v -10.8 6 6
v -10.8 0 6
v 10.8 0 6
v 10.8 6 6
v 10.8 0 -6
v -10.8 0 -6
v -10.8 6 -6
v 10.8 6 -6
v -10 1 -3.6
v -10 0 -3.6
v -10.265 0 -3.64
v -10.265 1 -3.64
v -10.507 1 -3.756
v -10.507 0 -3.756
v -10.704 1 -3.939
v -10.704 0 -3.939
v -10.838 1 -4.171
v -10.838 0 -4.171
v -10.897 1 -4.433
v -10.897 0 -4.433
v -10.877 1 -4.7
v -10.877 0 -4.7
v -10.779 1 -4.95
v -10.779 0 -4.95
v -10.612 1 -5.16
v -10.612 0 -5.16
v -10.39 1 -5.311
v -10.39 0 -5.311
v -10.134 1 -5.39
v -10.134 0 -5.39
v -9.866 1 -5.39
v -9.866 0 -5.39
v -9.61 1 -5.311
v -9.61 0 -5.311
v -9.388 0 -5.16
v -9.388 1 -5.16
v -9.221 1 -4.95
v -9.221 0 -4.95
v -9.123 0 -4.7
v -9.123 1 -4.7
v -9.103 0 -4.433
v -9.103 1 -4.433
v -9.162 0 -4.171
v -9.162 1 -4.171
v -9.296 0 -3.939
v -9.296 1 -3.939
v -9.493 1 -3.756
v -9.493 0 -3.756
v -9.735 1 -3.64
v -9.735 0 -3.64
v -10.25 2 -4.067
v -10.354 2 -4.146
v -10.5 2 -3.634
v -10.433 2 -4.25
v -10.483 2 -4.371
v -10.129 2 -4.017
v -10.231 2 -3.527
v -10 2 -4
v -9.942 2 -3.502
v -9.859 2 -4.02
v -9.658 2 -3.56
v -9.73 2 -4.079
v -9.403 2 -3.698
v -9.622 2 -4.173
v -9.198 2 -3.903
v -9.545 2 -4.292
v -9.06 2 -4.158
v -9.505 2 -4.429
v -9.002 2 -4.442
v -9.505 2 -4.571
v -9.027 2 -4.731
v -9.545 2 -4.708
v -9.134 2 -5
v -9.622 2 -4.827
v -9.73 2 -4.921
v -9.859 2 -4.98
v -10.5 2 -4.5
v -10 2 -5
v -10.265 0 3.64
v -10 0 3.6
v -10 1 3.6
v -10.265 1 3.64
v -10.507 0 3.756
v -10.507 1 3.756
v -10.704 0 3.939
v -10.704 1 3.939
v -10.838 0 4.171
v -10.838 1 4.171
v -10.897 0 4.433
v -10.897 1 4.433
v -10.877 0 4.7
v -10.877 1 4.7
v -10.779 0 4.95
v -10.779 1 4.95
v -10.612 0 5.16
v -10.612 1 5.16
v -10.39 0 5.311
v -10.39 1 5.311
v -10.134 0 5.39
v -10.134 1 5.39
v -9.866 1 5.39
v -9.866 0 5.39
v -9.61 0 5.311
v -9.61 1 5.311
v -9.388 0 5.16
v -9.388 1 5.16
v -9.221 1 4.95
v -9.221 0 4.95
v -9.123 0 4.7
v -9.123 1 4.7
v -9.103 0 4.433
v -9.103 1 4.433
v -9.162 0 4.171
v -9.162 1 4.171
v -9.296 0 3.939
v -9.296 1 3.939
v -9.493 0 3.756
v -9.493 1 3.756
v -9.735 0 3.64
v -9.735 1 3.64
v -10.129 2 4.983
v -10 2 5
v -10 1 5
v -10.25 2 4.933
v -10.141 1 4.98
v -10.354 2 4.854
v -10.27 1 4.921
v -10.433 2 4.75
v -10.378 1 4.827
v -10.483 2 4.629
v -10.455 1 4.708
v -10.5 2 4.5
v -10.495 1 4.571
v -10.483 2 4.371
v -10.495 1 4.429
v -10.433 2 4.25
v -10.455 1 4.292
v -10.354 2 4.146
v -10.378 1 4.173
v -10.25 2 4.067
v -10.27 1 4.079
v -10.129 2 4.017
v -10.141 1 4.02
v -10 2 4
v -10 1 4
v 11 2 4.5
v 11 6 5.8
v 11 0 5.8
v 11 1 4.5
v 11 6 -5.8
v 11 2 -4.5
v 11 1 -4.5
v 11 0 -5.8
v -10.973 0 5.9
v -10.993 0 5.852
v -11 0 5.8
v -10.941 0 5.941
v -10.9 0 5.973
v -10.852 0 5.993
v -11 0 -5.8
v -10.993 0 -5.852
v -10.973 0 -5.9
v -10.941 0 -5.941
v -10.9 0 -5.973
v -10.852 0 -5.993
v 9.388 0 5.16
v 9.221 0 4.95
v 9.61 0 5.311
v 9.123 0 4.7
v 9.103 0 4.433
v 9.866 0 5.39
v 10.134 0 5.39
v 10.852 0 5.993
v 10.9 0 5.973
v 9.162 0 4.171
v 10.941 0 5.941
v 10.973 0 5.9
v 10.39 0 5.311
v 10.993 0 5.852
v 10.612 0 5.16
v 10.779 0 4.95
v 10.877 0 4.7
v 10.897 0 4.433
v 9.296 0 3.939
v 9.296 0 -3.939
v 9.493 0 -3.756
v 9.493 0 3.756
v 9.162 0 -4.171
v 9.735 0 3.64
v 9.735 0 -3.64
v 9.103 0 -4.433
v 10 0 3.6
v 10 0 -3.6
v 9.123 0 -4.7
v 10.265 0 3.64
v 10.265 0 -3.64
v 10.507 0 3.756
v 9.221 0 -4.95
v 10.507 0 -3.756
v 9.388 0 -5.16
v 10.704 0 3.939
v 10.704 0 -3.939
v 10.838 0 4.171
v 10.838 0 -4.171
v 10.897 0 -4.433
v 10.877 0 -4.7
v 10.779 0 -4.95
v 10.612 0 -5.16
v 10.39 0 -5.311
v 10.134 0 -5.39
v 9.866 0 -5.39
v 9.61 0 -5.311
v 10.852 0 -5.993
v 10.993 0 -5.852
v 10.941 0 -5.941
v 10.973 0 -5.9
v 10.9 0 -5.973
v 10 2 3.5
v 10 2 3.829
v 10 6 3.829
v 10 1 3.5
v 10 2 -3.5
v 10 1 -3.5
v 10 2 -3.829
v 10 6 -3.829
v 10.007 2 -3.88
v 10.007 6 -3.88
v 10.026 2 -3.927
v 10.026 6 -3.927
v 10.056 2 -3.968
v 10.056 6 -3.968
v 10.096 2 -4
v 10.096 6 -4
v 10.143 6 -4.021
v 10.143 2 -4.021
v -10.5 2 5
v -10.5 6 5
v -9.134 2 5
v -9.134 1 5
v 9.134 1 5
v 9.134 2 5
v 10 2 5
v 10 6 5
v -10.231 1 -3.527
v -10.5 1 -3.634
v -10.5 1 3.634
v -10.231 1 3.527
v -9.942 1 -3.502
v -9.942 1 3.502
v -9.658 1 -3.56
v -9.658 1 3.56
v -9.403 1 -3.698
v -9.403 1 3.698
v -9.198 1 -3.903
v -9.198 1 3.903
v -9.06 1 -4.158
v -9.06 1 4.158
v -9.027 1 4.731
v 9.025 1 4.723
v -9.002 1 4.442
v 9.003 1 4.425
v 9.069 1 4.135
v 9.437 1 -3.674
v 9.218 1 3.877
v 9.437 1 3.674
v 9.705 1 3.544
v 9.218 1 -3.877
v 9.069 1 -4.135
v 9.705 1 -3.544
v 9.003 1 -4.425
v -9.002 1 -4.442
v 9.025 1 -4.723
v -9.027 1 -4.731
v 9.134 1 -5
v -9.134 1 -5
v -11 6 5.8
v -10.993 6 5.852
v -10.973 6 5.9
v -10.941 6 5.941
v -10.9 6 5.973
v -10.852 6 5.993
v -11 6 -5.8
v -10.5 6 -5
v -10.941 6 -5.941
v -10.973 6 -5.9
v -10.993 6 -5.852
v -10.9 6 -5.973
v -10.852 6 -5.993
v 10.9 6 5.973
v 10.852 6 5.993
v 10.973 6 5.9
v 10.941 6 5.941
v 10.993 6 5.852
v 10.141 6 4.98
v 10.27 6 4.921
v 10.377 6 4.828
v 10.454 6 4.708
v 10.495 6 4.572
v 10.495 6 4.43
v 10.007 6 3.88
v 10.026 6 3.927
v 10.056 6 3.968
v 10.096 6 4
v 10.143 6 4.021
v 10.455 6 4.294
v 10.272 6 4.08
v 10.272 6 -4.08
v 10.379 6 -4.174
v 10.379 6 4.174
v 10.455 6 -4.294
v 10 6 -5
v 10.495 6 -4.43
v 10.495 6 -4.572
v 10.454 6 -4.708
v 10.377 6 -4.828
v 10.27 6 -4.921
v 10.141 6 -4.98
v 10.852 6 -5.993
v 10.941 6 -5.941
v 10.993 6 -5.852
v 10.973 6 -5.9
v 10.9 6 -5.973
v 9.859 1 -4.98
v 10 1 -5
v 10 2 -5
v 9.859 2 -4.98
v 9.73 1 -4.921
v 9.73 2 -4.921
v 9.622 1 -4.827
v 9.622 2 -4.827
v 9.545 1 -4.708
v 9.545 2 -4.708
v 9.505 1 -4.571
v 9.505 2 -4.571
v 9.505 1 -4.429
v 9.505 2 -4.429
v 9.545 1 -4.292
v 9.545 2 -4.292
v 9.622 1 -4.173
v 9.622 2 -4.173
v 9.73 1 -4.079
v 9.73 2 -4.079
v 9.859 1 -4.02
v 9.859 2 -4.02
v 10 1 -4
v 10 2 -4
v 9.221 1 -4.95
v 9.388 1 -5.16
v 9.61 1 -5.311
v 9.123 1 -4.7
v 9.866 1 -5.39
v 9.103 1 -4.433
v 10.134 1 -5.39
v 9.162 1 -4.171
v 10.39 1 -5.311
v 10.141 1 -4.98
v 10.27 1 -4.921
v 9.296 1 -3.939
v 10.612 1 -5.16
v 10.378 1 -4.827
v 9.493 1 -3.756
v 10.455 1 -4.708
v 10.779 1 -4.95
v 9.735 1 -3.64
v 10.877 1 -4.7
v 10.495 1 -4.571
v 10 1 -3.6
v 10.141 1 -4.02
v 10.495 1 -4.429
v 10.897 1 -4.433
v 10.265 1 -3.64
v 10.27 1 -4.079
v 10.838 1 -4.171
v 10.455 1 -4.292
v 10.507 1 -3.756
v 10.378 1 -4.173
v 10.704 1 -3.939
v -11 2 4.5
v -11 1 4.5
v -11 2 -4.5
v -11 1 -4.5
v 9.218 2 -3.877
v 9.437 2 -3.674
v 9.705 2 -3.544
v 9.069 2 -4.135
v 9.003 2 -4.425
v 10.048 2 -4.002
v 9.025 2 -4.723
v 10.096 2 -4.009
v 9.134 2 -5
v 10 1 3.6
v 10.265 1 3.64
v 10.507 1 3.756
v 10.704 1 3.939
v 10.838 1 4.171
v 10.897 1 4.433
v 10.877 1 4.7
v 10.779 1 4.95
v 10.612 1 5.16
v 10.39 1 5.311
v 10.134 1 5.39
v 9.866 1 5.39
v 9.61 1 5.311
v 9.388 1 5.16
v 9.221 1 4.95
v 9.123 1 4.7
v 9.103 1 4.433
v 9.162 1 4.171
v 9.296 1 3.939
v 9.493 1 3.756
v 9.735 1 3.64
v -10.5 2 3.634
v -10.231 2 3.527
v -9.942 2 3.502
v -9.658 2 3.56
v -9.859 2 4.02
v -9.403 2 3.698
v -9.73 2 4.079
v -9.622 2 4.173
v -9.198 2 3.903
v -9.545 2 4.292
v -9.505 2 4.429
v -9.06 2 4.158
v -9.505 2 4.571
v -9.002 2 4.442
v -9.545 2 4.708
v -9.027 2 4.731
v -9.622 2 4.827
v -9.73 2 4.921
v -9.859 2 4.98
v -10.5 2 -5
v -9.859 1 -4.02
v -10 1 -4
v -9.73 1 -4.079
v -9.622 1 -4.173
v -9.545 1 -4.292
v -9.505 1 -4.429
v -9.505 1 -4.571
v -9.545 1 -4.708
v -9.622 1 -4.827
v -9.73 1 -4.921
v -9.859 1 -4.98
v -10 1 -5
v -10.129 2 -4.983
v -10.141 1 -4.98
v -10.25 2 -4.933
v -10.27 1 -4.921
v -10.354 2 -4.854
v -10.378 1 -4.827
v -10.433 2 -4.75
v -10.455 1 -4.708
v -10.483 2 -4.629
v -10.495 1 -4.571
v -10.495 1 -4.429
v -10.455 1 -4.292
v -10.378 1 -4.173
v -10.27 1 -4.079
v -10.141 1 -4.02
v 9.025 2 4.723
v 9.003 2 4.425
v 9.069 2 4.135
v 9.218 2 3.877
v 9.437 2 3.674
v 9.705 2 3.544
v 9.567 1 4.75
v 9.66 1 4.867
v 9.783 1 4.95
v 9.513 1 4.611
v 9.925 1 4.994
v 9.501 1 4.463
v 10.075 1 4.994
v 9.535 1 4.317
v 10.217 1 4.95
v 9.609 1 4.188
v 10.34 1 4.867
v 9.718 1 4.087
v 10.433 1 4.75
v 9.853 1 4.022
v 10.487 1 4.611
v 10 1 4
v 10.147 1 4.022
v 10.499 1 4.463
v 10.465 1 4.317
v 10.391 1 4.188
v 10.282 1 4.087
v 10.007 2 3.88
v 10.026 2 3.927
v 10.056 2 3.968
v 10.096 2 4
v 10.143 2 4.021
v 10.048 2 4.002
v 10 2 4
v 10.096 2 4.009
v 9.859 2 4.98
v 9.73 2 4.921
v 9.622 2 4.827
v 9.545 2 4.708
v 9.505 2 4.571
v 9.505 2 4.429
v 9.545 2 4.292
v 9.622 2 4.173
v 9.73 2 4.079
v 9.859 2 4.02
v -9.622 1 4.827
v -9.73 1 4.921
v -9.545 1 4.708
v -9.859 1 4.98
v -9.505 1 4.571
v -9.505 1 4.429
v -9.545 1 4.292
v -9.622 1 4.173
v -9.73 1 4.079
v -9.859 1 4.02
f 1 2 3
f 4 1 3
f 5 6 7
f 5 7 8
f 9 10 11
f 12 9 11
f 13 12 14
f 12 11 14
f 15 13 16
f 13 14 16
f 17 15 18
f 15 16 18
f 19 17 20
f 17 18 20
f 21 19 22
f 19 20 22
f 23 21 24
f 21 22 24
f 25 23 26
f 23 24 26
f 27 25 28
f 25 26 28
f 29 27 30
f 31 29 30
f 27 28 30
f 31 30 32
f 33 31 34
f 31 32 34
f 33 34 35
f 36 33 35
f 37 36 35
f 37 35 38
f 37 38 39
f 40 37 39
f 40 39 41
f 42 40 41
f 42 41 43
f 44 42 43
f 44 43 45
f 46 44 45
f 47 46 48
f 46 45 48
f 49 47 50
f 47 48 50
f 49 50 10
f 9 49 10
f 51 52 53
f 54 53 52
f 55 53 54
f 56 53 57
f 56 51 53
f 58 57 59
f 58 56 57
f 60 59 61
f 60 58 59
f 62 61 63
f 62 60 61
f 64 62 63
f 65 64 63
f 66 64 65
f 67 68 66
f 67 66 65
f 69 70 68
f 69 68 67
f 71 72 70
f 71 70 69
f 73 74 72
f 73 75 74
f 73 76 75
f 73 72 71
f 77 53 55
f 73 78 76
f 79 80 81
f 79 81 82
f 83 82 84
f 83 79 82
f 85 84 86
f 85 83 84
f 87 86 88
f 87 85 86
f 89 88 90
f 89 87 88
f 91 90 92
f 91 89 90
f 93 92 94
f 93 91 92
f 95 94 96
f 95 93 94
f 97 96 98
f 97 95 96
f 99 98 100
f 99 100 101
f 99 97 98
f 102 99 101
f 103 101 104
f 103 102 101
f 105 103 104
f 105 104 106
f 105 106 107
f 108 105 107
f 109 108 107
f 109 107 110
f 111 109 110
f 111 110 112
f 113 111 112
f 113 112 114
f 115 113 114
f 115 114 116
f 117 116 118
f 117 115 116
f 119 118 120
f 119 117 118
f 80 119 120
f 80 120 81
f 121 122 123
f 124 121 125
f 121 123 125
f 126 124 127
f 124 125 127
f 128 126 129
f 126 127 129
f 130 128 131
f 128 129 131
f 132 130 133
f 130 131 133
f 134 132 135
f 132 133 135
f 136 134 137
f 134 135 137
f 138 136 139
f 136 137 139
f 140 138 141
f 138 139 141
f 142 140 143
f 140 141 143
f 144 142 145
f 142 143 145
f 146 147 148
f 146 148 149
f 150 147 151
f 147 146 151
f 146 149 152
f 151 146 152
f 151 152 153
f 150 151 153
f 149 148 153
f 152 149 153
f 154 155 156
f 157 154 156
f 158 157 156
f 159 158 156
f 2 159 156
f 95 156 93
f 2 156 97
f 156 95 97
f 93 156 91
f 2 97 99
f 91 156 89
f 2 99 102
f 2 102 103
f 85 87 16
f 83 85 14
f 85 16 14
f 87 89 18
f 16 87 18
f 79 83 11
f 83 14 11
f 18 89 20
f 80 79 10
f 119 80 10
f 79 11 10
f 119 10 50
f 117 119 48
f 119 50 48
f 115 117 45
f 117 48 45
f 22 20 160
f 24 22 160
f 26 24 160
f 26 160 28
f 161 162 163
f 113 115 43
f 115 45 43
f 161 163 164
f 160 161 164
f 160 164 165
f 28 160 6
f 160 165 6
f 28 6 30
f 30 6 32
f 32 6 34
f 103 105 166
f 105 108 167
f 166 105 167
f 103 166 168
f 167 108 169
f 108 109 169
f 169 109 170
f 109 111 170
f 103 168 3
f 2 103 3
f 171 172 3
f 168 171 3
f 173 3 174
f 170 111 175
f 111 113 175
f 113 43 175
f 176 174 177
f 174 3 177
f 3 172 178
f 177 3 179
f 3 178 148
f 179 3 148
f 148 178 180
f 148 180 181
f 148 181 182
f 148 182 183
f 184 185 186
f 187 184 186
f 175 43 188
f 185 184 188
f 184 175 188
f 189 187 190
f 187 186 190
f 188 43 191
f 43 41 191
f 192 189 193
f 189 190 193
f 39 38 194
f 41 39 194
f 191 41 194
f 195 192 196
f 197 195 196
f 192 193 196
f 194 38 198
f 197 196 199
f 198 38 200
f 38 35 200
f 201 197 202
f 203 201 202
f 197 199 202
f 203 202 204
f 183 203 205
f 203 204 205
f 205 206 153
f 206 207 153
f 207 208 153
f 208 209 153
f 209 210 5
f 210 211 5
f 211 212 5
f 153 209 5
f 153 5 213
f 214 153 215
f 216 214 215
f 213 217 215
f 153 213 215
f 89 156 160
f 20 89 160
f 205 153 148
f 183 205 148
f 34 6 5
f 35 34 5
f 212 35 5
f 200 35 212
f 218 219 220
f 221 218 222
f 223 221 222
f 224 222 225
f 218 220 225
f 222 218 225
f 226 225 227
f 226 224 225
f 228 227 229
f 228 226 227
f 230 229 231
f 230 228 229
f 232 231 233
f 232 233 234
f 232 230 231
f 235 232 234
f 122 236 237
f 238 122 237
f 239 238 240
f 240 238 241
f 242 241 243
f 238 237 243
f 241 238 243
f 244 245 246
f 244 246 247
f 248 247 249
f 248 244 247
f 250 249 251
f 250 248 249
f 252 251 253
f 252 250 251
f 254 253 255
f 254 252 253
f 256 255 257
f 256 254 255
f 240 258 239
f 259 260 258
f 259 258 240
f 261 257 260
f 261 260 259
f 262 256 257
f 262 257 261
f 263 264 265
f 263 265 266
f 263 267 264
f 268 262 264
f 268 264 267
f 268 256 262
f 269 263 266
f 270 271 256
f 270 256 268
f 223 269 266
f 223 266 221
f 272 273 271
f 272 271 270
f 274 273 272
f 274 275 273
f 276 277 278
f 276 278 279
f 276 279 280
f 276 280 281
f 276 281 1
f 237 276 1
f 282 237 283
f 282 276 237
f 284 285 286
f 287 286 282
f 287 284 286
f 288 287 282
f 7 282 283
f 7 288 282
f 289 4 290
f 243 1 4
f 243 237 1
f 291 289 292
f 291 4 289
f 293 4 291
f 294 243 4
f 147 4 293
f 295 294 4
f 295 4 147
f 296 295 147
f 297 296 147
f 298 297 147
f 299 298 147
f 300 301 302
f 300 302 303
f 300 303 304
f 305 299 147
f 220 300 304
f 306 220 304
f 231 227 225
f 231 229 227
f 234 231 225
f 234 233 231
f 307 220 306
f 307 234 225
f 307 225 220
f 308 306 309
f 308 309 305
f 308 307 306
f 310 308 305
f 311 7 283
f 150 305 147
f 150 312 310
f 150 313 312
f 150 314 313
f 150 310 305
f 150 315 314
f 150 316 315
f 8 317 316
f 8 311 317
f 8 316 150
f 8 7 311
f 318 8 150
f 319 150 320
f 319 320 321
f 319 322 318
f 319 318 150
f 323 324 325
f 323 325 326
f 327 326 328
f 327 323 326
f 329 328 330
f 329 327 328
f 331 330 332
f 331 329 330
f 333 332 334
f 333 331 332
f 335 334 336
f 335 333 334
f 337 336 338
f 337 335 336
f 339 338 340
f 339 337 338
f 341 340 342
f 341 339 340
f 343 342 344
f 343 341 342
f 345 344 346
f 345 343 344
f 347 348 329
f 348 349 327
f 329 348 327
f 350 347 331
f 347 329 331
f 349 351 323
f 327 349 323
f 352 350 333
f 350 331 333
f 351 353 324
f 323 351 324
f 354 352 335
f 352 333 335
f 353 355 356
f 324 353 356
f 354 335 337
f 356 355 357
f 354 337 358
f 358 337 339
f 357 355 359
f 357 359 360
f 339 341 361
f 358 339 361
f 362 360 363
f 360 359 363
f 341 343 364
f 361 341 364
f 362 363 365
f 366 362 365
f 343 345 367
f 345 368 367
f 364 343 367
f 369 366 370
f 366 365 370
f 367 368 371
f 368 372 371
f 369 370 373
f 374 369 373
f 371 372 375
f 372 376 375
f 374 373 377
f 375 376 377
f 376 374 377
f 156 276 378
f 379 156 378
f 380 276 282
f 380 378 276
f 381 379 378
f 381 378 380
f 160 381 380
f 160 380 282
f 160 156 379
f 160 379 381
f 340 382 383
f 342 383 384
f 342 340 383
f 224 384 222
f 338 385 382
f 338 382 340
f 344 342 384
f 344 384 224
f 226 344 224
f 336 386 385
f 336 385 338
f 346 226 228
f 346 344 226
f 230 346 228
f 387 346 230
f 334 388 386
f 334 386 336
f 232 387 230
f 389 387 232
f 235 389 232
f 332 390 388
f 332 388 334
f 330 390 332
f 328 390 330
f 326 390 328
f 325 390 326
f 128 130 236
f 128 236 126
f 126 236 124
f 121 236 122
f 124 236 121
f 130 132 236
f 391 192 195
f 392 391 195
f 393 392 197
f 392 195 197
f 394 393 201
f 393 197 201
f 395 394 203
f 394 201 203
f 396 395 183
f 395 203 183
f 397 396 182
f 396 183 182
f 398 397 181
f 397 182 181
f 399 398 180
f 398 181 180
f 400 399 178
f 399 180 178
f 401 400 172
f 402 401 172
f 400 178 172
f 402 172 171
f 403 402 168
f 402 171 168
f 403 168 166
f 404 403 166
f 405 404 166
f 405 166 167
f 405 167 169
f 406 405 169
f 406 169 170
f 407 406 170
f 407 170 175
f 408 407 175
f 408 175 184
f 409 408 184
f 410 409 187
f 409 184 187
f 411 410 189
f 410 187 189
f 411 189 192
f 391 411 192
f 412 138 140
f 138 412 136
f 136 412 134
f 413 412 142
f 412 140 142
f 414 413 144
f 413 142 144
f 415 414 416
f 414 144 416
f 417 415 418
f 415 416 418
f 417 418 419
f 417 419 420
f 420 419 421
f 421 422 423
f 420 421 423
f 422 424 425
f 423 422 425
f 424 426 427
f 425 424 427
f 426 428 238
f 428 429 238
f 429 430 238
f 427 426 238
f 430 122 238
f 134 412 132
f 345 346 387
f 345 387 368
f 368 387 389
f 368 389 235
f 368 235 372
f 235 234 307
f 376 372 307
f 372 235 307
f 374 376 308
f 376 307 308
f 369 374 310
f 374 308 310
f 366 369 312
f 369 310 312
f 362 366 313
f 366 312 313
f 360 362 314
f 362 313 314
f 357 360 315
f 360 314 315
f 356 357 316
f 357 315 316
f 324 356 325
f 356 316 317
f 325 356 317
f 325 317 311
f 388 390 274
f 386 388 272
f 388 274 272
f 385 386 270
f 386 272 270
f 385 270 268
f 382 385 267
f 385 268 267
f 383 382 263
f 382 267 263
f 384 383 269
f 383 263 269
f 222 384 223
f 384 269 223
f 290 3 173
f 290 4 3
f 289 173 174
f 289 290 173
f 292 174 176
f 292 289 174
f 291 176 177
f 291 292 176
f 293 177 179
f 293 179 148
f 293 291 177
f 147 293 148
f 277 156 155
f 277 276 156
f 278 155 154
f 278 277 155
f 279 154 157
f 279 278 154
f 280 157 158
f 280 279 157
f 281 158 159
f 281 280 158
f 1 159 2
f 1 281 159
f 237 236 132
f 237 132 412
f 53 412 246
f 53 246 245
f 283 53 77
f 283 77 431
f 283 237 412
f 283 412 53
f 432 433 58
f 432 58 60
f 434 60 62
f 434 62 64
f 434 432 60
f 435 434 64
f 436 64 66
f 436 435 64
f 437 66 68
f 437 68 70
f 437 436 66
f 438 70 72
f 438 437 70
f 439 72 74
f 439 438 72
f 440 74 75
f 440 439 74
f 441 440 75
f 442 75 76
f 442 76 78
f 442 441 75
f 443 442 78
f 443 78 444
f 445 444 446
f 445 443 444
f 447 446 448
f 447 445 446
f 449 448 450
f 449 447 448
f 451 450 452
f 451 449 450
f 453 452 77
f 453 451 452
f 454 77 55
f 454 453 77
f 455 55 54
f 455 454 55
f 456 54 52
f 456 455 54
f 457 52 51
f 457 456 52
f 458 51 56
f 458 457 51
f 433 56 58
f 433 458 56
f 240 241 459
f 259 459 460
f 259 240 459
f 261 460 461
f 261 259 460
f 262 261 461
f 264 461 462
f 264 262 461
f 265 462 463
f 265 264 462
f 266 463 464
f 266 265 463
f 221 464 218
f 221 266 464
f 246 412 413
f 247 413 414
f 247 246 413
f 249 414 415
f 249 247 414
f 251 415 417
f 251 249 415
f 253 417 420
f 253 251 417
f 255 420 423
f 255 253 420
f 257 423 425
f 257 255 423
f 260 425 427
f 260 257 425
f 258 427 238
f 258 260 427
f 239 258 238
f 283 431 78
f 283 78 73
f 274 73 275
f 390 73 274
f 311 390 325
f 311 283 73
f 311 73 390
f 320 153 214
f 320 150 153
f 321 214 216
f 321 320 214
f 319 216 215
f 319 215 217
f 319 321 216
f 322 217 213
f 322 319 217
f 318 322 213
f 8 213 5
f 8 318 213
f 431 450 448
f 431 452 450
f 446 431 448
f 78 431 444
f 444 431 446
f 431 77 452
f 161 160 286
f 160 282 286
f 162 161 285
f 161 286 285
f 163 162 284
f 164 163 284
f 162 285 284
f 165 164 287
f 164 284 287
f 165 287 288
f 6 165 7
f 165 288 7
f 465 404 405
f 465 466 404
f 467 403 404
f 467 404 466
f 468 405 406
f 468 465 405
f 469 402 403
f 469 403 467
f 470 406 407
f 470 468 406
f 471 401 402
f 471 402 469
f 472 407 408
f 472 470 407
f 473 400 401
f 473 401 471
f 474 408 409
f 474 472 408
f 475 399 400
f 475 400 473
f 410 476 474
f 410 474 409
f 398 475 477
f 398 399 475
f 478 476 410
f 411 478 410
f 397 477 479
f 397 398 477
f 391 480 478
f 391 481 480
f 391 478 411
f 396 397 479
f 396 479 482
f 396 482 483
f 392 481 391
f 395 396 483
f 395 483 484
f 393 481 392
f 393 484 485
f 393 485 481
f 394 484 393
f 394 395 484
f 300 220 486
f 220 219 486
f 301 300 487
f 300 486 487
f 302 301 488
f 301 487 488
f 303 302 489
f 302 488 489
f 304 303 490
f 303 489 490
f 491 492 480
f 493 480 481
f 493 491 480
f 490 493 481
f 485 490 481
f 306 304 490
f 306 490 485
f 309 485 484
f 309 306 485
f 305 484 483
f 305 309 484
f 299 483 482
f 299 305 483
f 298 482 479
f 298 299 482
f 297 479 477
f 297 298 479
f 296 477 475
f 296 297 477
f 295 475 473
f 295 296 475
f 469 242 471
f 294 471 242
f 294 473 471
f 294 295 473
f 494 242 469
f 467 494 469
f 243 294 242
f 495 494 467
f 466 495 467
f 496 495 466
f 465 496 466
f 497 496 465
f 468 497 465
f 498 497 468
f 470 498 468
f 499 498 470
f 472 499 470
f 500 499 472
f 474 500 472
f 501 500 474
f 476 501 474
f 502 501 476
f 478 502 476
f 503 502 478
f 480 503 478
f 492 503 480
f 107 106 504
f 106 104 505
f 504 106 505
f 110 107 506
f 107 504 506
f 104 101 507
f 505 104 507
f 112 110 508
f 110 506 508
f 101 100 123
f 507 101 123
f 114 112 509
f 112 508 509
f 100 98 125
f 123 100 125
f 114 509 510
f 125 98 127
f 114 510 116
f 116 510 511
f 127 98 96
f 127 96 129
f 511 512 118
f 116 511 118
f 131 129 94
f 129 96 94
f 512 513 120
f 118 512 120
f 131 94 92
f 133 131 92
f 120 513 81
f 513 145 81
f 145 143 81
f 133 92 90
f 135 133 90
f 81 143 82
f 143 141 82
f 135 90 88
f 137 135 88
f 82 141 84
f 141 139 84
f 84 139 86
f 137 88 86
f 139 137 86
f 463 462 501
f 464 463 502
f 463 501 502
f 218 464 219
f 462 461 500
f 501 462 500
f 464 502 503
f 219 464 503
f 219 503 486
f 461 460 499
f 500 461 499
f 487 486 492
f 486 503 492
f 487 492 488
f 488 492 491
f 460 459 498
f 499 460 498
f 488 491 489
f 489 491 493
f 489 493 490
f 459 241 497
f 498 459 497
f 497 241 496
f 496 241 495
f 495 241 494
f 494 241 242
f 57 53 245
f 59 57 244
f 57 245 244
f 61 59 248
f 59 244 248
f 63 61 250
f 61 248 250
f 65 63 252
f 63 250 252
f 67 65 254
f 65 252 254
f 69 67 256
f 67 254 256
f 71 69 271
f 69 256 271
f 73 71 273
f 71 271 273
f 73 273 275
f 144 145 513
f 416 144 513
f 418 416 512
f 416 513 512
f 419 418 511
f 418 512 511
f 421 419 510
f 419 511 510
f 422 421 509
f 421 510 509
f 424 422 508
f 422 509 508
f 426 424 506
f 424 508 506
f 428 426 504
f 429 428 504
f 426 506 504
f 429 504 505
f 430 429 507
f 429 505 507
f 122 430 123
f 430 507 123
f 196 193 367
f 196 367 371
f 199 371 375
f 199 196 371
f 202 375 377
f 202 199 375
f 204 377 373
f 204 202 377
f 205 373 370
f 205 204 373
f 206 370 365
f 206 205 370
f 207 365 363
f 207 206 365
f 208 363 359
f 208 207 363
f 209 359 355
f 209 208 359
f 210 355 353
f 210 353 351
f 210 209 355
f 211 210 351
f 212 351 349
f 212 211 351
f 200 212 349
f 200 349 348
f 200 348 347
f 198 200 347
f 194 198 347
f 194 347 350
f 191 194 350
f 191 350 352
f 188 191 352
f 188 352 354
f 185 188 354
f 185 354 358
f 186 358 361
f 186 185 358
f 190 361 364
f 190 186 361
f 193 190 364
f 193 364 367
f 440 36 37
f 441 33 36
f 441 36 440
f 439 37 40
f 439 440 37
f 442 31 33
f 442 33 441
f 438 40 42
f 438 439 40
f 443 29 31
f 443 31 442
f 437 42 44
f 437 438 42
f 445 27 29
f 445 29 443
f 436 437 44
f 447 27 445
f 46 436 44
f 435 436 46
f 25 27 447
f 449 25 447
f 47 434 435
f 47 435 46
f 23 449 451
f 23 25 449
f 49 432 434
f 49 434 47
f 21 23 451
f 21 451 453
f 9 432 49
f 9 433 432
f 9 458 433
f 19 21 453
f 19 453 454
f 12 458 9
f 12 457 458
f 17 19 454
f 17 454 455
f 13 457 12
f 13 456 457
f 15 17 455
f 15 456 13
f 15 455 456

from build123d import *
from build123d.topology import SkipClean

# Parameters (mm, degrees)
SKETCH1_W               = 22
SKETCH1_H               = 12
BOSS_EXTRUDE1_DEPTH     = 6
FILLET1_R               = 0.2
SKETCH2_W               = 20.5
SKETCH2_H               = 10
CUT_EXTRUDE1_DEPTH      = 5
SKETCH3_R               = 1
SKETCH3_R_2             = 0.5
BOSS_EXTRUDE2_DEPTH     = 1
SKETCH7_R               = 1
SKETCH7_R_2             = 0.5
BOSS_EXTRUDE3_DEPTH     = 1
SKETCH8_R               = 0.5
CUT_EXTRUDE4_DEPTH      = 14.892443989
FILLET2_R               = 0.2
MIRROR5_COPY_1_SKETCH_R = 0.5
MIRROR5_COPY_1_DEPTH    = 14.892443989
SKETCH9_R               = 0.9
CUT_EXTRUDE12_DEPTH     = 1
MIRROR7_COPY_1_SKETCH_R = 0.9
MIRROR7_COPY_1_DEPTH    = 1


with BuildPart() as part:
    # Sketch1 → Boss-Extrude1 (new body)
    with BuildSketch(Plane(origin=(0, 0, 0), x_dir=(1, 0, 0), z_dir=(0, 1, 0))):
        Rectangle(SKETCH1_W, SKETCH1_H)
    extrude(amount=BOSS_EXTRUDE1_DEPTH)

    # Fillet1
    fillet1_edges = [part.edges().sort_by_distance(p)[0] for p in [
        (11, 3, 6),
        (-11, 3, 6),
        (-11, 3, -6),
        (11, 3, -6),
    ]]
    fillet(fillet1_edges, radius=FILLET1_R)

    # Sketch2 → Cut-Extrude1 (cut)
    with BuildSketch(Plane(origin=(0, 6, 0), x_dir=(1, 0, 0), z_dir=(0, 1, 0))):
        with Locations((-0.25, 0)):
            Rectangle(SKETCH2_W, SKETCH2_H)
    extrude(amount=-CUT_EXTRUDE1_DEPTH, mode=Mode.SUBTRACT)

    # Sketch3 → Boss-Extrude2 (add)
    with BuildSketch(Plane(origin=(0, 1, 0), x_dir=(1, 0, 0), z_dir=(0, 1, 0))):
        with Locations((10, 4.5)):
            Circle(SKETCH3_R)
        with Locations((10, 4.5)):
            Circle(SKETCH3_R_2, mode=Mode.SUBTRACT)
    boss_extrude2 = extrude(amount=BOSS_EXTRUDE2_DEPTH)

    # Mirror1: Boss-Extrude2 across plane
    add(boss_extrude2.mirror(Plane.XY))

    # Sketch7 → Boss-Extrude3 (add)
    with BuildSketch(Plane(origin=(0, 1, 0), x_dir=(1, 0, 0), z_dir=(0, 1, 0))):
        with Locations((-10, 4.5)):
            Circle(SKETCH7_R)
        with Locations(Location((-10, 4.5, 0), (0, 0, 90))):
            Circle(SKETCH7_R_2, mode=Mode.SUBTRACT)
    boss_extrude3 = extrude(amount=BOSS_EXTRUDE3_DEPTH)

    # Mirror3: Boss-Extrude3 across plane
    add(boss_extrude3.mirror(Plane.XY))

    # Sketch8 → Cut-Extrude4 (cut, through all)
    with SkipClean():  # the faces are left unmerged after this step: merging them gives an invalid solid
        with BuildSketch(Plane(origin=(0, 6, 0), x_dir=(1, 0, 0), z_dir=(0, 1, 0))):
            with Locations(Location((10, 4.5, 0), (0, 0, 270))):
                Circle(SKETCH8_R)
        cut_extrude4 = extrude(amount=-CUT_EXTRUDE4_DEPTH, mode=Mode.SUBTRACT)

    # Mirror4: Cut-Extrude4 across plane
    with SkipClean():  # the faces are left unmerged after this step: merging them gives an invalid solid
        add(cut_extrude4.mirror(Plane.XY), mode=Mode.SUBTRACT)

    # Fillet2
    fillet2_edges = [part.edges().sort_by_distance(p)[0] for p in [
        (10, 4, -4),
        (10, 4, 4),
    ]]
    fillet(fillet2_edges, radius=FILLET2_R)

    # Mirror5: Cut-Extrude4 across plane
    with SkipClean():  # the faces are left unmerged after this step: merging them gives an invalid solid
        add(cut_extrude4.mirror(Plane(origin=(0, 0, 0), x_dir=(0, 0, 1), z_dir=(1, 0, 0))), mode=Mode.SUBTRACT)

    # Mirror5 copy 1 sketch → Mirror5 copy 1 (cut, through all)
    with SkipClean():  # the faces are left unmerged after this step: merging them gives an invalid solid
        with BuildSketch(Plane(origin=(0, 6, 0), x_dir=(-1, 0, 0), z_dir=(0, 1, 0))):
            with Locations(Location((10, 4.5, 0), (0, 0, 270))):
                Circle(MIRROR5_COPY_1_SKETCH_R)
        extrude(amount=-MIRROR5_COPY_1_DEPTH, mode=Mode.SUBTRACT)

    # Sketch9 → Cut-Extrude12 (cut)
    with SkipClean():  # the faces are left unmerged after this step: merging them gives an invalid solid
        with BuildSketch(Plane(origin=(0, 0, 0), x_dir=(-1, 0, 0), z_dir=(0, -1, 0))):
            with Locations(Location((-10, -4.5, 0), (0, 0, 90))):
                Circle(SKETCH9_R)
        cut_extrude12 = extrude(amount=-CUT_EXTRUDE12_DEPTH, mode=Mode.SUBTRACT)

    # Mirror6: Cut-Extrude12 across plane
    with SkipClean():  # the faces are left unmerged after this step: merging them gives an invalid solid
        add(cut_extrude12.mirror(Plane(origin=(0, 0, 0), x_dir=(0, 0, 1), z_dir=(1, 0, 0))), mode=Mode.SUBTRACT)

    # Mirror7: Cut-Extrude12 across plane
    add(cut_extrude12.mirror(Plane.XY), mode=Mode.SUBTRACT)

    # Mirror7 copy 1 sketch → Mirror7 copy 1 (cut)
    with SkipClean():  # the faces are left unmerged after this step: merging them gives an invalid solid
        with BuildSketch(Plane.XZ):
            with Locations(Location((-10, -4.5, 0), (0, 0, 90))):
                Circle(MIRROR7_COPY_1_SKETCH_R)
        extrude(amount=-MIRROR7_COPY_1_DEPTH, mode=Mode.SUBTRACT)


solid = part.part
